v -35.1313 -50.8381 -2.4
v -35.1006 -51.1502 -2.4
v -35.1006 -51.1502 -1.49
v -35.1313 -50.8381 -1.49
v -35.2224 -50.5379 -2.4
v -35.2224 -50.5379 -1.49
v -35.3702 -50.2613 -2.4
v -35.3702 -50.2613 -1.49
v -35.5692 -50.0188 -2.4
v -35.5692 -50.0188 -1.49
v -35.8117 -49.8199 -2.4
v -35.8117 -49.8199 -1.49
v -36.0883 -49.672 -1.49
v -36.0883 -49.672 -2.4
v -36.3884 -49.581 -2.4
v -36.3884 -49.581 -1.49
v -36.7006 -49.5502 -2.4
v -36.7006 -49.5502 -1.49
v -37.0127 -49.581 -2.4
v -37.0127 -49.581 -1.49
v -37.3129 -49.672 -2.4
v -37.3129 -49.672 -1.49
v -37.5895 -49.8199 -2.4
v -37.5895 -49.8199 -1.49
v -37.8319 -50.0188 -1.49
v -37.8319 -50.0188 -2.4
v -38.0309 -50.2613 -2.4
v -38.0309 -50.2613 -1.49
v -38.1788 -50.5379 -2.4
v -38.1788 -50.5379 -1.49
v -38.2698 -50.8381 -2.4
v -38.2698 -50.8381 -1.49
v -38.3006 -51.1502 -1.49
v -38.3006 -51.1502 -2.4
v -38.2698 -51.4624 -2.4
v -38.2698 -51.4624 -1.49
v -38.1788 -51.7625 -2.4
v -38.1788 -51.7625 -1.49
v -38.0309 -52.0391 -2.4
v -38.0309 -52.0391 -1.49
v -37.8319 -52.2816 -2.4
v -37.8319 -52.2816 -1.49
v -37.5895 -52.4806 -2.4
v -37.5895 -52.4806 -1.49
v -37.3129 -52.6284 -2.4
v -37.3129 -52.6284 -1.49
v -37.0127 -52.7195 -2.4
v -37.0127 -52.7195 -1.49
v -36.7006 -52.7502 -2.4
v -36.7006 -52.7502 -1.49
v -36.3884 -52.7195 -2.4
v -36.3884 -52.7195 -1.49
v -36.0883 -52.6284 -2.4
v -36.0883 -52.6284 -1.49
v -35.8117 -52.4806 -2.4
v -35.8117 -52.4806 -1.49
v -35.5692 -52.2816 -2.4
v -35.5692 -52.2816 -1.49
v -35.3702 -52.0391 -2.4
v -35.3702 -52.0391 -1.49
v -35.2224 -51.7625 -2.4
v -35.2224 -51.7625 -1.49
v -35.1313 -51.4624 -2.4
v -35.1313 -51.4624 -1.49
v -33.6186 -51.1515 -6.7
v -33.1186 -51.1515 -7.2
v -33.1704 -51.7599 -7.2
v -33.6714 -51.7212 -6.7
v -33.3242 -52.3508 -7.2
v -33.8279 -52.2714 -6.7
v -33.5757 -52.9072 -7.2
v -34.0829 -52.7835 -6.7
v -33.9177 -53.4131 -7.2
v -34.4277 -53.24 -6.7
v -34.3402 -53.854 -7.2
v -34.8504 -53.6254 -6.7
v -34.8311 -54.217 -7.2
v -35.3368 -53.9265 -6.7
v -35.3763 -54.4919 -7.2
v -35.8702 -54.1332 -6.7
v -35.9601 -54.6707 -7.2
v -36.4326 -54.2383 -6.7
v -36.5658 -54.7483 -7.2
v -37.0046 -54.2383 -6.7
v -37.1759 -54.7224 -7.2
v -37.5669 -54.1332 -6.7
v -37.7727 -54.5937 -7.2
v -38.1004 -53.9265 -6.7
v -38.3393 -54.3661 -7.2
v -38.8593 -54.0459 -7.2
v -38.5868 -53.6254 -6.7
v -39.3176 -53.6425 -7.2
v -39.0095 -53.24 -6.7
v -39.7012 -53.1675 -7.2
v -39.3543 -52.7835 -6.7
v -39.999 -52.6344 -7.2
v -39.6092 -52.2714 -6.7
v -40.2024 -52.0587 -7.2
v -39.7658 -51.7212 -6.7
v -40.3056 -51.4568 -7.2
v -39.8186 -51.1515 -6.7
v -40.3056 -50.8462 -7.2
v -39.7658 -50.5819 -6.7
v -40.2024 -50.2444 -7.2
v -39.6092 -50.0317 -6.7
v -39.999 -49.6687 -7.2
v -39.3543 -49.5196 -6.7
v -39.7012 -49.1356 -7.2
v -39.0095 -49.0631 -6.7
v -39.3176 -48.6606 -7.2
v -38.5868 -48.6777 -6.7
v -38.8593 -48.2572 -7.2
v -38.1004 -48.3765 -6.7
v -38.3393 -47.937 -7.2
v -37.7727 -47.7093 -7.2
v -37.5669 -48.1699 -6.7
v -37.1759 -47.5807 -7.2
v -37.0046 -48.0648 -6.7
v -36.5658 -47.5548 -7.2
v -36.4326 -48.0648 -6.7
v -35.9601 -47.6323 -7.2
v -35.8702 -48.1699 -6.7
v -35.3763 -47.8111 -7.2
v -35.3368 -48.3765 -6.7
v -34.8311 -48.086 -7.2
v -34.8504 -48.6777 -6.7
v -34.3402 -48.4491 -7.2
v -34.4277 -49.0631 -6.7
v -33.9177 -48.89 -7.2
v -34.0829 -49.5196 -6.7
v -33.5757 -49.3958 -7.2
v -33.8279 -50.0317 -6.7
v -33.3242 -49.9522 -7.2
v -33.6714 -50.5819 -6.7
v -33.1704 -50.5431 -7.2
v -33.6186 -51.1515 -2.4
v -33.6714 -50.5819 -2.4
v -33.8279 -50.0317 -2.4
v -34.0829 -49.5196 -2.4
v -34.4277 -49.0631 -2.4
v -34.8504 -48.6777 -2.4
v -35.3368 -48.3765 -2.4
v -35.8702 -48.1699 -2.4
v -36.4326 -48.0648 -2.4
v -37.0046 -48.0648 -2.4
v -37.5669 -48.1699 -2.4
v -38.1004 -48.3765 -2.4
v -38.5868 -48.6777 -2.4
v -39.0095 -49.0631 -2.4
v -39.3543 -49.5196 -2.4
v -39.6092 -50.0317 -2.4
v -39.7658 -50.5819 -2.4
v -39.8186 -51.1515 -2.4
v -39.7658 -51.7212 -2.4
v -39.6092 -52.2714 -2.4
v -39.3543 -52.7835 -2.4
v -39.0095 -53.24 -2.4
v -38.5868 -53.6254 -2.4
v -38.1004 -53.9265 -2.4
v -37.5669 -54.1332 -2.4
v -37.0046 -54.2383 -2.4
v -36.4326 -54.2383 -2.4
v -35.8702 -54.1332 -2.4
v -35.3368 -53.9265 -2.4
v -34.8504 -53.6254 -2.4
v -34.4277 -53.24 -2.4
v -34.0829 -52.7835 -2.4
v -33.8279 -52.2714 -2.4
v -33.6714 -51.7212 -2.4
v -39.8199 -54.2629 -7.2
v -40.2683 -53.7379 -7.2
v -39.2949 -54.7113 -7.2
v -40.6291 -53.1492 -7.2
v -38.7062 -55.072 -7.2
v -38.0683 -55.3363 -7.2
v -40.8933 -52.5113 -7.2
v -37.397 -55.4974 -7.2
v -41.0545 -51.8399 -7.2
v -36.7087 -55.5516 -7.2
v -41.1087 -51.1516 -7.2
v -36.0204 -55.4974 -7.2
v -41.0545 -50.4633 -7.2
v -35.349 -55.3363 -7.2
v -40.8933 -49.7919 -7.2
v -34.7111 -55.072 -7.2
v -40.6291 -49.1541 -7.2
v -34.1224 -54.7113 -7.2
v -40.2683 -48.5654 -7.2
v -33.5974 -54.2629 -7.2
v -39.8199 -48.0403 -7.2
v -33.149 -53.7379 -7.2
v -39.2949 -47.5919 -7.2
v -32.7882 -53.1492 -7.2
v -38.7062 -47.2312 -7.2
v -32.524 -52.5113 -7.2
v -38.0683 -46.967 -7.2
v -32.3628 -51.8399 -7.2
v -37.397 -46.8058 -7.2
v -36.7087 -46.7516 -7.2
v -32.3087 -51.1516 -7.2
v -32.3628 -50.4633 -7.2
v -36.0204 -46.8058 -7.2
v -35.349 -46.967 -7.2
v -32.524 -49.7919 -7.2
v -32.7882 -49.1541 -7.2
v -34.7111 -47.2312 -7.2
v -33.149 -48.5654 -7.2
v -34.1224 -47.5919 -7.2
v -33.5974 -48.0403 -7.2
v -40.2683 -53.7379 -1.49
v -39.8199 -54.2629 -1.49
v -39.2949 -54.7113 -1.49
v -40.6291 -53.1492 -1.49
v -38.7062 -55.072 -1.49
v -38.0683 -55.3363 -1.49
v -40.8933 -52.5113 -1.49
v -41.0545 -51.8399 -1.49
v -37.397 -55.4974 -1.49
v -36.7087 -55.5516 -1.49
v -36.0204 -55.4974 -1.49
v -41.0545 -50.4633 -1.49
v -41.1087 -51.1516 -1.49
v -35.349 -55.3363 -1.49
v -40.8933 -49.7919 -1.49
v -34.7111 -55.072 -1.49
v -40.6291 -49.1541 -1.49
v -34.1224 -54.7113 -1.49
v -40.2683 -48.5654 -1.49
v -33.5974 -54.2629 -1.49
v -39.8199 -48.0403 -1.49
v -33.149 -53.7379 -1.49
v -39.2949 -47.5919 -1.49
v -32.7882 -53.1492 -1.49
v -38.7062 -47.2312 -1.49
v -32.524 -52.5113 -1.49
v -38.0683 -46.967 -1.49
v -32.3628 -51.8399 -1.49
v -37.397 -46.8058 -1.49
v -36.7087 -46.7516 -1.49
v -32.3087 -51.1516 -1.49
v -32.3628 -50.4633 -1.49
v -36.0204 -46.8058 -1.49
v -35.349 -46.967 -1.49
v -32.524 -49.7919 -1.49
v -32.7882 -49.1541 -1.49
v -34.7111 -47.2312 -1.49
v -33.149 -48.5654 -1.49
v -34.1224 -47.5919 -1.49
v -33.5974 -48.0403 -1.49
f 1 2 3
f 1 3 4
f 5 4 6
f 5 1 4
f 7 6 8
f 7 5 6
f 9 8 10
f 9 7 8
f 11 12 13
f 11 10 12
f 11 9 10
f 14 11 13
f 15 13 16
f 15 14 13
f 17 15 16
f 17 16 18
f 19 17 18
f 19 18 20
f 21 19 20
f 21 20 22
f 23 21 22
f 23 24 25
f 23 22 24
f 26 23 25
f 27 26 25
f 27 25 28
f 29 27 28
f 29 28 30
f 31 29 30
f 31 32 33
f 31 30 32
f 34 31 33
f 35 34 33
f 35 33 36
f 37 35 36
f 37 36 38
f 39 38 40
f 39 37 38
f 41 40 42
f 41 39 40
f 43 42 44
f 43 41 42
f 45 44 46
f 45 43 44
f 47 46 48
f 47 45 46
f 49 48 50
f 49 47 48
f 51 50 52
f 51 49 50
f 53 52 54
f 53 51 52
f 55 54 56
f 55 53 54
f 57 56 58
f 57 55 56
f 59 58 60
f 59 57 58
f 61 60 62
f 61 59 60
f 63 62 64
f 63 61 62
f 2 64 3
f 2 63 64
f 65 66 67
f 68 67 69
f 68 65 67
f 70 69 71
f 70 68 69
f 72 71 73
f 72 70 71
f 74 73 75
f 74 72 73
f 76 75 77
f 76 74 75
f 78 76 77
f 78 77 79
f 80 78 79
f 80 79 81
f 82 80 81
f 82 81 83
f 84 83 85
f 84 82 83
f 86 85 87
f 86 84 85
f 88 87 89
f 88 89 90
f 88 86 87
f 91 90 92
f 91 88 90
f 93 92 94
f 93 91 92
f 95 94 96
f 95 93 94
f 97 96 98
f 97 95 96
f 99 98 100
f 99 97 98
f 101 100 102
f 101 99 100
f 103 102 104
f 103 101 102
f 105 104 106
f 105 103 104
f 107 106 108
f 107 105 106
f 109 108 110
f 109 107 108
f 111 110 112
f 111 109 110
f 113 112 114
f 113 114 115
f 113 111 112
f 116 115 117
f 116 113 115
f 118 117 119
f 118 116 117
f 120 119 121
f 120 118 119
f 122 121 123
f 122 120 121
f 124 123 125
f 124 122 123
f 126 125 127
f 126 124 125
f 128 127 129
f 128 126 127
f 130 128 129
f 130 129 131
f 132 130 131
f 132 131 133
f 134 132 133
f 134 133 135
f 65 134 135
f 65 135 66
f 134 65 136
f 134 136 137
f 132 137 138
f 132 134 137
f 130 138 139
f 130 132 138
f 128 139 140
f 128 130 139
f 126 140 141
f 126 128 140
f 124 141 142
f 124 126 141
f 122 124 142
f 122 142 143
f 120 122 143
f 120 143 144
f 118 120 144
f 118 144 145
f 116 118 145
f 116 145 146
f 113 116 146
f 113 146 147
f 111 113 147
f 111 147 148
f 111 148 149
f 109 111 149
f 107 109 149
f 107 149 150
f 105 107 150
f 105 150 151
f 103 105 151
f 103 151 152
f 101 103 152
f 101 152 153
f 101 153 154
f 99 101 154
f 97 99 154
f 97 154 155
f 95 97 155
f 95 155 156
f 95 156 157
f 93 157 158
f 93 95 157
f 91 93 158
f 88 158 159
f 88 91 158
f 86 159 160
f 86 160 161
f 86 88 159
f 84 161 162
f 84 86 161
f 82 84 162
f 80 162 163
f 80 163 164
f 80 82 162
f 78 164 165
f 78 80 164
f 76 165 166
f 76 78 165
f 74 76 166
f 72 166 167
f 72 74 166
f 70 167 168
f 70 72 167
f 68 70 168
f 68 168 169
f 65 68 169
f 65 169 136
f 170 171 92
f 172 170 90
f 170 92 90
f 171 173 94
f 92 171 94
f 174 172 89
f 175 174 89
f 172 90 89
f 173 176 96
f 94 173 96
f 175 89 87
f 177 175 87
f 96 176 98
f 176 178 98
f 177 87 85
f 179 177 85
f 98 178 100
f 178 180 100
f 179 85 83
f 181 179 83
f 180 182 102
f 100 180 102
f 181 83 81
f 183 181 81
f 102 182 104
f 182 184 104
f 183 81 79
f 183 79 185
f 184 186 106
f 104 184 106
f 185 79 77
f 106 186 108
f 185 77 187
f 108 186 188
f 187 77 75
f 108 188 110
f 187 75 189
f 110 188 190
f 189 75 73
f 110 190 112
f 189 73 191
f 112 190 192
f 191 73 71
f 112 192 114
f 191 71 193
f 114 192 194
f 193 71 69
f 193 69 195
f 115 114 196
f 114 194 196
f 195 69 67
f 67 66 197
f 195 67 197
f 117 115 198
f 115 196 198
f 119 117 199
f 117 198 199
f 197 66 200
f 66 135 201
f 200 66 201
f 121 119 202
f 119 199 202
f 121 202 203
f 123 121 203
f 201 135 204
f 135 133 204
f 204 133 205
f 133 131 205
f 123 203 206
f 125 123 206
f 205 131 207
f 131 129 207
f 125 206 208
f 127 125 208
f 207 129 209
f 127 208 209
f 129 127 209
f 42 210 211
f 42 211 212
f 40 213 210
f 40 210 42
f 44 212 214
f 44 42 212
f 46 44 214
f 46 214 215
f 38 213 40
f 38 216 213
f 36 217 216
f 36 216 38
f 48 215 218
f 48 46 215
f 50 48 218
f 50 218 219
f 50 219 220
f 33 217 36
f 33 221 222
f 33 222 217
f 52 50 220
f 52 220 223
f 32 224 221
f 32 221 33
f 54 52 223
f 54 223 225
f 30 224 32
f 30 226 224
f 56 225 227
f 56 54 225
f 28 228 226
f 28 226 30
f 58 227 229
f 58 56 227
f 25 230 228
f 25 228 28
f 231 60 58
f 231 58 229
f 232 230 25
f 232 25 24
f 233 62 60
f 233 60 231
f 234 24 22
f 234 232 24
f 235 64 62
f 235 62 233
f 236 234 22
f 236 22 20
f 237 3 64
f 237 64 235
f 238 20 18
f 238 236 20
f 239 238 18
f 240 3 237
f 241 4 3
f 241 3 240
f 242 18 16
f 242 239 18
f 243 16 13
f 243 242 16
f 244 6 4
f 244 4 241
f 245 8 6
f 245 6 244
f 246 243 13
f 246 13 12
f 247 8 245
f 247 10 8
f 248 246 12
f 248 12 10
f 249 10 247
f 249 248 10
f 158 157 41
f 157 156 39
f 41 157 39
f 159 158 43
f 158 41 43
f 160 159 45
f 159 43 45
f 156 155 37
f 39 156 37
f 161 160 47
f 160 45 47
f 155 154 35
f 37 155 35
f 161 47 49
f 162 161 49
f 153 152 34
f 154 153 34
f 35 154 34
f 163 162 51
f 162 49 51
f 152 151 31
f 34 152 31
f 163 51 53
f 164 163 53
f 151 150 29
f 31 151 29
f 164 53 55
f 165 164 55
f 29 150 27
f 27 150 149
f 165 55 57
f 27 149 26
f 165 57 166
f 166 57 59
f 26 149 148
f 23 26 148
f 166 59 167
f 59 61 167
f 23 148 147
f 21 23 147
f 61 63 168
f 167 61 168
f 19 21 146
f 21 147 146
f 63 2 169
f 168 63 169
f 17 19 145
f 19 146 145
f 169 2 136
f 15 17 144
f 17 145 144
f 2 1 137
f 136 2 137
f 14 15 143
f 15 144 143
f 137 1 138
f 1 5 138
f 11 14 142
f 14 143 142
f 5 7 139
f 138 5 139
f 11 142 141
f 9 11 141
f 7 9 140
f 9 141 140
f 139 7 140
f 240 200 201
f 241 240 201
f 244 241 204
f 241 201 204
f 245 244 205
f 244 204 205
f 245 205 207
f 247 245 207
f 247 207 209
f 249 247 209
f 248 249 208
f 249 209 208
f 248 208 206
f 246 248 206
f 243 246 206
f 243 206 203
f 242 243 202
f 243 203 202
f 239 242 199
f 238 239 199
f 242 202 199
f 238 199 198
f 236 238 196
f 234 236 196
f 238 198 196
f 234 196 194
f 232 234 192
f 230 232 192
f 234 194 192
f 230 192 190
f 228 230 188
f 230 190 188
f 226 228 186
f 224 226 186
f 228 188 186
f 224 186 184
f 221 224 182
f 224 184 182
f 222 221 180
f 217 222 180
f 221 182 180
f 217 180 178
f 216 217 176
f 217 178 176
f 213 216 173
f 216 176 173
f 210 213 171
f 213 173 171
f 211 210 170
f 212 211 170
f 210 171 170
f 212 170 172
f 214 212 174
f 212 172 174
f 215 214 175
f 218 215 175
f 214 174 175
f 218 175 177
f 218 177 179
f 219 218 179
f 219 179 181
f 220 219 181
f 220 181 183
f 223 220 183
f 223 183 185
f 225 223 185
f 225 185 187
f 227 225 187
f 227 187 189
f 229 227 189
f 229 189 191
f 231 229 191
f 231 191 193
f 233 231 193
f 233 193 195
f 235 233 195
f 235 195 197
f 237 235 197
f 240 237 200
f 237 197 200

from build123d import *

# Parameters (mm, degrees)
SKETCH016_R     = 4.4
PAD004_DEPTH    = 5.71
SKETCH017_R     = 3.1
POCKET008_DEPTH = 5
SKETCH018_R     = 1.6
POCKET009_DEPTH = 7.2
CHAMFER004_SIZE = 0.5


with BuildPart() as part:
    # Sketch016 → Pad004 (new body)
    with BuildSketch(Plane.XY.offset(-7.2)):
        with Locations((-36.708672, -51.151615)):
            Circle(SKETCH016_R)
    extrude(amount=PAD004_DEPTH)

    # Sketch017 → Pocket008 (cut)
    with BuildSketch(Plane.XY.offset(-7.4)):
        with Locations((-36.718586, -51.151543)):
            Circle(SKETCH017_R)
    extrude(amount=POCKET008_DEPTH, mode=Mode.SUBTRACT)

    # Sketch018 → Pocket009 (cut)
    with BuildSketch(Plane.XY.offset(-7.2)):
        with Locations((-36.700569, -51.150215)):
            Circle(SKETCH018_R)
    extrude(amount=POCKET009_DEPTH, mode=Mode.SUBTRACT)

    # Chamfer004
    chamfer004_edges = [part.edges().sort_by_distance(p)[0] for p in [
        (-39.818586, -51.151543, -7.2),
    ]]
    chamfer(chamfer004_edges, length=CHAMFER004_SIZE)


solid = part.part
